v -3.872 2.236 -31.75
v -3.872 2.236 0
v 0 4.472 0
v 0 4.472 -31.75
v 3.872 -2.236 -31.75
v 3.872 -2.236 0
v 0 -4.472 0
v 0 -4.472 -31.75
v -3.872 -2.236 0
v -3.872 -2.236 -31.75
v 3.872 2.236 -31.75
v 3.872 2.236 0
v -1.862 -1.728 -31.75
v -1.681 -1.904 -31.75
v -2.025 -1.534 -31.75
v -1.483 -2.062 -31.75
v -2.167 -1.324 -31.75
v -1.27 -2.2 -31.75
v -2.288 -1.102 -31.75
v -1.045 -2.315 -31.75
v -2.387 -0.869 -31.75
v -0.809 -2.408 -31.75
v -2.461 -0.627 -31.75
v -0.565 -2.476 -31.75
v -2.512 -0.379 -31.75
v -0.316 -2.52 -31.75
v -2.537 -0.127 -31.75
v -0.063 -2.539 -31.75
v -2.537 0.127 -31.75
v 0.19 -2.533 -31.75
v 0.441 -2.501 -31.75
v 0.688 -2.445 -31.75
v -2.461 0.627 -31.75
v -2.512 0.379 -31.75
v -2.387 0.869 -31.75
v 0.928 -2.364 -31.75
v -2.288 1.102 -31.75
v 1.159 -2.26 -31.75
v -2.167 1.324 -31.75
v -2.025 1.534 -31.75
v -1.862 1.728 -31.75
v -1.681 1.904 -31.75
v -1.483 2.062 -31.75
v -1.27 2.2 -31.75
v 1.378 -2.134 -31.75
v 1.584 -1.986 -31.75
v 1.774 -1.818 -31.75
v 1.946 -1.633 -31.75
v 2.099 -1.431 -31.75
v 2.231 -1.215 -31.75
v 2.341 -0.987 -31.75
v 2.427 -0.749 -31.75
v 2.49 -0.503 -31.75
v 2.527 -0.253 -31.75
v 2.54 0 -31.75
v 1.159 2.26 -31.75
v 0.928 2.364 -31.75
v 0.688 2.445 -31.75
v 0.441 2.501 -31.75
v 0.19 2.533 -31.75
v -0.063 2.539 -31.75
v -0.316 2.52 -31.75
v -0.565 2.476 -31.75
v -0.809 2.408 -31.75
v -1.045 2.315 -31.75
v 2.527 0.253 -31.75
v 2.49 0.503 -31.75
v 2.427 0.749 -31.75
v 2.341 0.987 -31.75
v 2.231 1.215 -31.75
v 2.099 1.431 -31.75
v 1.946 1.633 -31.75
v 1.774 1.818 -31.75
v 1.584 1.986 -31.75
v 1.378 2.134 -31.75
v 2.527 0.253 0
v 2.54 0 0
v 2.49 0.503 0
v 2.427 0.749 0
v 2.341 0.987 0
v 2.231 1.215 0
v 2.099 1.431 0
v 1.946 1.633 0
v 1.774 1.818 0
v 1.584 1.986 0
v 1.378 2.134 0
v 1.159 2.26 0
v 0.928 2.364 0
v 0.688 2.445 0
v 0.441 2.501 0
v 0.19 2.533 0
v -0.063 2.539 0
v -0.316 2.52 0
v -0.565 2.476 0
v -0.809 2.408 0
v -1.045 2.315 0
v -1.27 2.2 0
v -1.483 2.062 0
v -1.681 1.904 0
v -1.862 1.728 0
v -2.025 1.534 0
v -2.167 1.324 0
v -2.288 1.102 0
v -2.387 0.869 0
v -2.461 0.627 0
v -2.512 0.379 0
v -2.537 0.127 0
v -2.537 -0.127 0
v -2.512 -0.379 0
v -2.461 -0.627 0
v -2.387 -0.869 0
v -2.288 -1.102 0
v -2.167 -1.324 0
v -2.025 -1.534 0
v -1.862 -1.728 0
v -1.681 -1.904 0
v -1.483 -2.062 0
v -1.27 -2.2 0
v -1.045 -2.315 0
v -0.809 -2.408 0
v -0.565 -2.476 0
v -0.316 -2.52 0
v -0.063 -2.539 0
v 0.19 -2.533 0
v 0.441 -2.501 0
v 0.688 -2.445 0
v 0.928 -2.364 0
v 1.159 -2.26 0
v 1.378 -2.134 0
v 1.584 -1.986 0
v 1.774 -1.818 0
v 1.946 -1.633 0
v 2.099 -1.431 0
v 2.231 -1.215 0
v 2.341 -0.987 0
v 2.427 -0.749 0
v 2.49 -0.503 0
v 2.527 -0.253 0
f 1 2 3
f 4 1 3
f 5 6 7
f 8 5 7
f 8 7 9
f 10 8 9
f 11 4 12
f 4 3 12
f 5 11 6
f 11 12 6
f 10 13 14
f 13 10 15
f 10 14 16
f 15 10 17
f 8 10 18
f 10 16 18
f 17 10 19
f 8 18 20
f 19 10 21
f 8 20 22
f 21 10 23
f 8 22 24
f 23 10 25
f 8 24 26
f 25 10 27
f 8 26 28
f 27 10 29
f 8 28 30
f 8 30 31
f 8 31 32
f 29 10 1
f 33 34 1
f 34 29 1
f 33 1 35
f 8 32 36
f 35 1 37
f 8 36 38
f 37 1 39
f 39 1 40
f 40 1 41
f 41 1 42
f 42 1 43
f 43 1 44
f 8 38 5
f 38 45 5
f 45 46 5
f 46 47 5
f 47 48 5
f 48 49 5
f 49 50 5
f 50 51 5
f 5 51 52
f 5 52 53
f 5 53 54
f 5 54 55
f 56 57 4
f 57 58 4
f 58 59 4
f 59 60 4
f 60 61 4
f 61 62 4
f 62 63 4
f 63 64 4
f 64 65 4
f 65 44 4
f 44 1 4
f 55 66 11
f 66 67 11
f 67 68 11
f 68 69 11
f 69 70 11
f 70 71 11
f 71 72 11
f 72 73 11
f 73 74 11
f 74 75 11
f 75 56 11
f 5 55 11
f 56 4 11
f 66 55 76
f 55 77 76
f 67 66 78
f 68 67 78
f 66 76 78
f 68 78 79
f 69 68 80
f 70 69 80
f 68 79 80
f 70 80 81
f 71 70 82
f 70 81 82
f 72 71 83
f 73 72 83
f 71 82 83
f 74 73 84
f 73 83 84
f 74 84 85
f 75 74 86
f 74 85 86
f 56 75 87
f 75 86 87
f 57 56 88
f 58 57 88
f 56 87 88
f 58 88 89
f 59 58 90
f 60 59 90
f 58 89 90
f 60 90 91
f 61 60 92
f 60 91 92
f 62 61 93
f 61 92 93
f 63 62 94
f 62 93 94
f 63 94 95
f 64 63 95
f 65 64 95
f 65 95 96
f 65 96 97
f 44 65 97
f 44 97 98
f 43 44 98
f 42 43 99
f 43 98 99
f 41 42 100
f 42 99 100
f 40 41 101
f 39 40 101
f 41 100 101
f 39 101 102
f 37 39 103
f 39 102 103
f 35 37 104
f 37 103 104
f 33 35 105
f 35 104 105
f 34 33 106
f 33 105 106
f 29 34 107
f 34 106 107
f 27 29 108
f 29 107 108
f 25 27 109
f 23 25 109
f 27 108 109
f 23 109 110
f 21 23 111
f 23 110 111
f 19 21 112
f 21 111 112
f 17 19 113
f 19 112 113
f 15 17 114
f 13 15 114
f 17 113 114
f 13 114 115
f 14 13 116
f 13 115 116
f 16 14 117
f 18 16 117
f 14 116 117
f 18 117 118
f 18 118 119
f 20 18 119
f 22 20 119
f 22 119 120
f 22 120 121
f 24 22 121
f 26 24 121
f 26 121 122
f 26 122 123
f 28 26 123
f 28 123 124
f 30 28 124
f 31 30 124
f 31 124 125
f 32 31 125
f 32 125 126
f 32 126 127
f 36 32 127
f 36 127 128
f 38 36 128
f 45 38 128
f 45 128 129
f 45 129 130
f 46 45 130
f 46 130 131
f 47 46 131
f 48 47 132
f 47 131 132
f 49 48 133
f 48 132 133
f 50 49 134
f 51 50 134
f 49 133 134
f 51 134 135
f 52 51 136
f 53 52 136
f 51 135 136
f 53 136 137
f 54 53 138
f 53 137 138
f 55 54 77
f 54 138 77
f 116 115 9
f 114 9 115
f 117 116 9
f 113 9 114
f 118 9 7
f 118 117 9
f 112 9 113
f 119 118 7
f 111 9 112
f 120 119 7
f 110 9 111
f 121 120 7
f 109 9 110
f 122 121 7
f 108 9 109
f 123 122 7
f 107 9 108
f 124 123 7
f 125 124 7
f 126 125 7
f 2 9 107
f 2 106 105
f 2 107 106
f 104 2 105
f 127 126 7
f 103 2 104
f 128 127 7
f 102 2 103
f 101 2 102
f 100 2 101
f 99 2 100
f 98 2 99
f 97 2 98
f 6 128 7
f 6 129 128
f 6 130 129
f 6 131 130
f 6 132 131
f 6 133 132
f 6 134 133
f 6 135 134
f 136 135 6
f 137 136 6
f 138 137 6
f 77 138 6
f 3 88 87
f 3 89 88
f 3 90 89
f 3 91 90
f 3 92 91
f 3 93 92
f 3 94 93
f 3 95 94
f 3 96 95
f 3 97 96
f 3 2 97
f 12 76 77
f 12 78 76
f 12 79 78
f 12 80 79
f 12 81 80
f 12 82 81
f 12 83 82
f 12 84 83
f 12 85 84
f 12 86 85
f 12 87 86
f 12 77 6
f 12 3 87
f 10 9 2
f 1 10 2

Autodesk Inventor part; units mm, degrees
ref_plane "YZ Plane" through (0, 0, 0) normal (1, 0, 0) x (0, 1, 0)
ref_plane "XZ Plane" through (0, 0, 0) normal (0, 1, 0) x (-1, 0, 0)
ref_plane "XY Plane" through (0, 0, 0) normal (0, 0, 1) x (1, 0, 0)
sketch "Sketch1" plane through (0, 0, 0) normal (0, 0, 1) x (1, 0, 0)
  circle A0 centre (0, 0) radius 3.81
  circle A1 centre (0, 0) radius 2.54
  line L0 (0, 4.4715) -> (3.8725, 2.2358)
  line L1 (3.8725, 2.2358) -> (3.8725, -2.2358)
  line L2 (3.8725, -2.2358) -> (0, -4.4715)
  line L3 (0, -4.4715) -> (-3.8725, -2.2358)
  line L4 (-3.8725, -2.2358) -> (-3.8725, 2.2358)
  line L5 (-3.8725, 2.2358) -> (0, 4.4715)
  dimension "d0" = 5.08
  dimension "d1" = 7.62
extrude "Extrusion1" add sketch "Sketch1" against normal blind 31.75 contours A0 | L0 L1 L2 L3 L4 L5
properties part number "Stand offs BD motor mount"
